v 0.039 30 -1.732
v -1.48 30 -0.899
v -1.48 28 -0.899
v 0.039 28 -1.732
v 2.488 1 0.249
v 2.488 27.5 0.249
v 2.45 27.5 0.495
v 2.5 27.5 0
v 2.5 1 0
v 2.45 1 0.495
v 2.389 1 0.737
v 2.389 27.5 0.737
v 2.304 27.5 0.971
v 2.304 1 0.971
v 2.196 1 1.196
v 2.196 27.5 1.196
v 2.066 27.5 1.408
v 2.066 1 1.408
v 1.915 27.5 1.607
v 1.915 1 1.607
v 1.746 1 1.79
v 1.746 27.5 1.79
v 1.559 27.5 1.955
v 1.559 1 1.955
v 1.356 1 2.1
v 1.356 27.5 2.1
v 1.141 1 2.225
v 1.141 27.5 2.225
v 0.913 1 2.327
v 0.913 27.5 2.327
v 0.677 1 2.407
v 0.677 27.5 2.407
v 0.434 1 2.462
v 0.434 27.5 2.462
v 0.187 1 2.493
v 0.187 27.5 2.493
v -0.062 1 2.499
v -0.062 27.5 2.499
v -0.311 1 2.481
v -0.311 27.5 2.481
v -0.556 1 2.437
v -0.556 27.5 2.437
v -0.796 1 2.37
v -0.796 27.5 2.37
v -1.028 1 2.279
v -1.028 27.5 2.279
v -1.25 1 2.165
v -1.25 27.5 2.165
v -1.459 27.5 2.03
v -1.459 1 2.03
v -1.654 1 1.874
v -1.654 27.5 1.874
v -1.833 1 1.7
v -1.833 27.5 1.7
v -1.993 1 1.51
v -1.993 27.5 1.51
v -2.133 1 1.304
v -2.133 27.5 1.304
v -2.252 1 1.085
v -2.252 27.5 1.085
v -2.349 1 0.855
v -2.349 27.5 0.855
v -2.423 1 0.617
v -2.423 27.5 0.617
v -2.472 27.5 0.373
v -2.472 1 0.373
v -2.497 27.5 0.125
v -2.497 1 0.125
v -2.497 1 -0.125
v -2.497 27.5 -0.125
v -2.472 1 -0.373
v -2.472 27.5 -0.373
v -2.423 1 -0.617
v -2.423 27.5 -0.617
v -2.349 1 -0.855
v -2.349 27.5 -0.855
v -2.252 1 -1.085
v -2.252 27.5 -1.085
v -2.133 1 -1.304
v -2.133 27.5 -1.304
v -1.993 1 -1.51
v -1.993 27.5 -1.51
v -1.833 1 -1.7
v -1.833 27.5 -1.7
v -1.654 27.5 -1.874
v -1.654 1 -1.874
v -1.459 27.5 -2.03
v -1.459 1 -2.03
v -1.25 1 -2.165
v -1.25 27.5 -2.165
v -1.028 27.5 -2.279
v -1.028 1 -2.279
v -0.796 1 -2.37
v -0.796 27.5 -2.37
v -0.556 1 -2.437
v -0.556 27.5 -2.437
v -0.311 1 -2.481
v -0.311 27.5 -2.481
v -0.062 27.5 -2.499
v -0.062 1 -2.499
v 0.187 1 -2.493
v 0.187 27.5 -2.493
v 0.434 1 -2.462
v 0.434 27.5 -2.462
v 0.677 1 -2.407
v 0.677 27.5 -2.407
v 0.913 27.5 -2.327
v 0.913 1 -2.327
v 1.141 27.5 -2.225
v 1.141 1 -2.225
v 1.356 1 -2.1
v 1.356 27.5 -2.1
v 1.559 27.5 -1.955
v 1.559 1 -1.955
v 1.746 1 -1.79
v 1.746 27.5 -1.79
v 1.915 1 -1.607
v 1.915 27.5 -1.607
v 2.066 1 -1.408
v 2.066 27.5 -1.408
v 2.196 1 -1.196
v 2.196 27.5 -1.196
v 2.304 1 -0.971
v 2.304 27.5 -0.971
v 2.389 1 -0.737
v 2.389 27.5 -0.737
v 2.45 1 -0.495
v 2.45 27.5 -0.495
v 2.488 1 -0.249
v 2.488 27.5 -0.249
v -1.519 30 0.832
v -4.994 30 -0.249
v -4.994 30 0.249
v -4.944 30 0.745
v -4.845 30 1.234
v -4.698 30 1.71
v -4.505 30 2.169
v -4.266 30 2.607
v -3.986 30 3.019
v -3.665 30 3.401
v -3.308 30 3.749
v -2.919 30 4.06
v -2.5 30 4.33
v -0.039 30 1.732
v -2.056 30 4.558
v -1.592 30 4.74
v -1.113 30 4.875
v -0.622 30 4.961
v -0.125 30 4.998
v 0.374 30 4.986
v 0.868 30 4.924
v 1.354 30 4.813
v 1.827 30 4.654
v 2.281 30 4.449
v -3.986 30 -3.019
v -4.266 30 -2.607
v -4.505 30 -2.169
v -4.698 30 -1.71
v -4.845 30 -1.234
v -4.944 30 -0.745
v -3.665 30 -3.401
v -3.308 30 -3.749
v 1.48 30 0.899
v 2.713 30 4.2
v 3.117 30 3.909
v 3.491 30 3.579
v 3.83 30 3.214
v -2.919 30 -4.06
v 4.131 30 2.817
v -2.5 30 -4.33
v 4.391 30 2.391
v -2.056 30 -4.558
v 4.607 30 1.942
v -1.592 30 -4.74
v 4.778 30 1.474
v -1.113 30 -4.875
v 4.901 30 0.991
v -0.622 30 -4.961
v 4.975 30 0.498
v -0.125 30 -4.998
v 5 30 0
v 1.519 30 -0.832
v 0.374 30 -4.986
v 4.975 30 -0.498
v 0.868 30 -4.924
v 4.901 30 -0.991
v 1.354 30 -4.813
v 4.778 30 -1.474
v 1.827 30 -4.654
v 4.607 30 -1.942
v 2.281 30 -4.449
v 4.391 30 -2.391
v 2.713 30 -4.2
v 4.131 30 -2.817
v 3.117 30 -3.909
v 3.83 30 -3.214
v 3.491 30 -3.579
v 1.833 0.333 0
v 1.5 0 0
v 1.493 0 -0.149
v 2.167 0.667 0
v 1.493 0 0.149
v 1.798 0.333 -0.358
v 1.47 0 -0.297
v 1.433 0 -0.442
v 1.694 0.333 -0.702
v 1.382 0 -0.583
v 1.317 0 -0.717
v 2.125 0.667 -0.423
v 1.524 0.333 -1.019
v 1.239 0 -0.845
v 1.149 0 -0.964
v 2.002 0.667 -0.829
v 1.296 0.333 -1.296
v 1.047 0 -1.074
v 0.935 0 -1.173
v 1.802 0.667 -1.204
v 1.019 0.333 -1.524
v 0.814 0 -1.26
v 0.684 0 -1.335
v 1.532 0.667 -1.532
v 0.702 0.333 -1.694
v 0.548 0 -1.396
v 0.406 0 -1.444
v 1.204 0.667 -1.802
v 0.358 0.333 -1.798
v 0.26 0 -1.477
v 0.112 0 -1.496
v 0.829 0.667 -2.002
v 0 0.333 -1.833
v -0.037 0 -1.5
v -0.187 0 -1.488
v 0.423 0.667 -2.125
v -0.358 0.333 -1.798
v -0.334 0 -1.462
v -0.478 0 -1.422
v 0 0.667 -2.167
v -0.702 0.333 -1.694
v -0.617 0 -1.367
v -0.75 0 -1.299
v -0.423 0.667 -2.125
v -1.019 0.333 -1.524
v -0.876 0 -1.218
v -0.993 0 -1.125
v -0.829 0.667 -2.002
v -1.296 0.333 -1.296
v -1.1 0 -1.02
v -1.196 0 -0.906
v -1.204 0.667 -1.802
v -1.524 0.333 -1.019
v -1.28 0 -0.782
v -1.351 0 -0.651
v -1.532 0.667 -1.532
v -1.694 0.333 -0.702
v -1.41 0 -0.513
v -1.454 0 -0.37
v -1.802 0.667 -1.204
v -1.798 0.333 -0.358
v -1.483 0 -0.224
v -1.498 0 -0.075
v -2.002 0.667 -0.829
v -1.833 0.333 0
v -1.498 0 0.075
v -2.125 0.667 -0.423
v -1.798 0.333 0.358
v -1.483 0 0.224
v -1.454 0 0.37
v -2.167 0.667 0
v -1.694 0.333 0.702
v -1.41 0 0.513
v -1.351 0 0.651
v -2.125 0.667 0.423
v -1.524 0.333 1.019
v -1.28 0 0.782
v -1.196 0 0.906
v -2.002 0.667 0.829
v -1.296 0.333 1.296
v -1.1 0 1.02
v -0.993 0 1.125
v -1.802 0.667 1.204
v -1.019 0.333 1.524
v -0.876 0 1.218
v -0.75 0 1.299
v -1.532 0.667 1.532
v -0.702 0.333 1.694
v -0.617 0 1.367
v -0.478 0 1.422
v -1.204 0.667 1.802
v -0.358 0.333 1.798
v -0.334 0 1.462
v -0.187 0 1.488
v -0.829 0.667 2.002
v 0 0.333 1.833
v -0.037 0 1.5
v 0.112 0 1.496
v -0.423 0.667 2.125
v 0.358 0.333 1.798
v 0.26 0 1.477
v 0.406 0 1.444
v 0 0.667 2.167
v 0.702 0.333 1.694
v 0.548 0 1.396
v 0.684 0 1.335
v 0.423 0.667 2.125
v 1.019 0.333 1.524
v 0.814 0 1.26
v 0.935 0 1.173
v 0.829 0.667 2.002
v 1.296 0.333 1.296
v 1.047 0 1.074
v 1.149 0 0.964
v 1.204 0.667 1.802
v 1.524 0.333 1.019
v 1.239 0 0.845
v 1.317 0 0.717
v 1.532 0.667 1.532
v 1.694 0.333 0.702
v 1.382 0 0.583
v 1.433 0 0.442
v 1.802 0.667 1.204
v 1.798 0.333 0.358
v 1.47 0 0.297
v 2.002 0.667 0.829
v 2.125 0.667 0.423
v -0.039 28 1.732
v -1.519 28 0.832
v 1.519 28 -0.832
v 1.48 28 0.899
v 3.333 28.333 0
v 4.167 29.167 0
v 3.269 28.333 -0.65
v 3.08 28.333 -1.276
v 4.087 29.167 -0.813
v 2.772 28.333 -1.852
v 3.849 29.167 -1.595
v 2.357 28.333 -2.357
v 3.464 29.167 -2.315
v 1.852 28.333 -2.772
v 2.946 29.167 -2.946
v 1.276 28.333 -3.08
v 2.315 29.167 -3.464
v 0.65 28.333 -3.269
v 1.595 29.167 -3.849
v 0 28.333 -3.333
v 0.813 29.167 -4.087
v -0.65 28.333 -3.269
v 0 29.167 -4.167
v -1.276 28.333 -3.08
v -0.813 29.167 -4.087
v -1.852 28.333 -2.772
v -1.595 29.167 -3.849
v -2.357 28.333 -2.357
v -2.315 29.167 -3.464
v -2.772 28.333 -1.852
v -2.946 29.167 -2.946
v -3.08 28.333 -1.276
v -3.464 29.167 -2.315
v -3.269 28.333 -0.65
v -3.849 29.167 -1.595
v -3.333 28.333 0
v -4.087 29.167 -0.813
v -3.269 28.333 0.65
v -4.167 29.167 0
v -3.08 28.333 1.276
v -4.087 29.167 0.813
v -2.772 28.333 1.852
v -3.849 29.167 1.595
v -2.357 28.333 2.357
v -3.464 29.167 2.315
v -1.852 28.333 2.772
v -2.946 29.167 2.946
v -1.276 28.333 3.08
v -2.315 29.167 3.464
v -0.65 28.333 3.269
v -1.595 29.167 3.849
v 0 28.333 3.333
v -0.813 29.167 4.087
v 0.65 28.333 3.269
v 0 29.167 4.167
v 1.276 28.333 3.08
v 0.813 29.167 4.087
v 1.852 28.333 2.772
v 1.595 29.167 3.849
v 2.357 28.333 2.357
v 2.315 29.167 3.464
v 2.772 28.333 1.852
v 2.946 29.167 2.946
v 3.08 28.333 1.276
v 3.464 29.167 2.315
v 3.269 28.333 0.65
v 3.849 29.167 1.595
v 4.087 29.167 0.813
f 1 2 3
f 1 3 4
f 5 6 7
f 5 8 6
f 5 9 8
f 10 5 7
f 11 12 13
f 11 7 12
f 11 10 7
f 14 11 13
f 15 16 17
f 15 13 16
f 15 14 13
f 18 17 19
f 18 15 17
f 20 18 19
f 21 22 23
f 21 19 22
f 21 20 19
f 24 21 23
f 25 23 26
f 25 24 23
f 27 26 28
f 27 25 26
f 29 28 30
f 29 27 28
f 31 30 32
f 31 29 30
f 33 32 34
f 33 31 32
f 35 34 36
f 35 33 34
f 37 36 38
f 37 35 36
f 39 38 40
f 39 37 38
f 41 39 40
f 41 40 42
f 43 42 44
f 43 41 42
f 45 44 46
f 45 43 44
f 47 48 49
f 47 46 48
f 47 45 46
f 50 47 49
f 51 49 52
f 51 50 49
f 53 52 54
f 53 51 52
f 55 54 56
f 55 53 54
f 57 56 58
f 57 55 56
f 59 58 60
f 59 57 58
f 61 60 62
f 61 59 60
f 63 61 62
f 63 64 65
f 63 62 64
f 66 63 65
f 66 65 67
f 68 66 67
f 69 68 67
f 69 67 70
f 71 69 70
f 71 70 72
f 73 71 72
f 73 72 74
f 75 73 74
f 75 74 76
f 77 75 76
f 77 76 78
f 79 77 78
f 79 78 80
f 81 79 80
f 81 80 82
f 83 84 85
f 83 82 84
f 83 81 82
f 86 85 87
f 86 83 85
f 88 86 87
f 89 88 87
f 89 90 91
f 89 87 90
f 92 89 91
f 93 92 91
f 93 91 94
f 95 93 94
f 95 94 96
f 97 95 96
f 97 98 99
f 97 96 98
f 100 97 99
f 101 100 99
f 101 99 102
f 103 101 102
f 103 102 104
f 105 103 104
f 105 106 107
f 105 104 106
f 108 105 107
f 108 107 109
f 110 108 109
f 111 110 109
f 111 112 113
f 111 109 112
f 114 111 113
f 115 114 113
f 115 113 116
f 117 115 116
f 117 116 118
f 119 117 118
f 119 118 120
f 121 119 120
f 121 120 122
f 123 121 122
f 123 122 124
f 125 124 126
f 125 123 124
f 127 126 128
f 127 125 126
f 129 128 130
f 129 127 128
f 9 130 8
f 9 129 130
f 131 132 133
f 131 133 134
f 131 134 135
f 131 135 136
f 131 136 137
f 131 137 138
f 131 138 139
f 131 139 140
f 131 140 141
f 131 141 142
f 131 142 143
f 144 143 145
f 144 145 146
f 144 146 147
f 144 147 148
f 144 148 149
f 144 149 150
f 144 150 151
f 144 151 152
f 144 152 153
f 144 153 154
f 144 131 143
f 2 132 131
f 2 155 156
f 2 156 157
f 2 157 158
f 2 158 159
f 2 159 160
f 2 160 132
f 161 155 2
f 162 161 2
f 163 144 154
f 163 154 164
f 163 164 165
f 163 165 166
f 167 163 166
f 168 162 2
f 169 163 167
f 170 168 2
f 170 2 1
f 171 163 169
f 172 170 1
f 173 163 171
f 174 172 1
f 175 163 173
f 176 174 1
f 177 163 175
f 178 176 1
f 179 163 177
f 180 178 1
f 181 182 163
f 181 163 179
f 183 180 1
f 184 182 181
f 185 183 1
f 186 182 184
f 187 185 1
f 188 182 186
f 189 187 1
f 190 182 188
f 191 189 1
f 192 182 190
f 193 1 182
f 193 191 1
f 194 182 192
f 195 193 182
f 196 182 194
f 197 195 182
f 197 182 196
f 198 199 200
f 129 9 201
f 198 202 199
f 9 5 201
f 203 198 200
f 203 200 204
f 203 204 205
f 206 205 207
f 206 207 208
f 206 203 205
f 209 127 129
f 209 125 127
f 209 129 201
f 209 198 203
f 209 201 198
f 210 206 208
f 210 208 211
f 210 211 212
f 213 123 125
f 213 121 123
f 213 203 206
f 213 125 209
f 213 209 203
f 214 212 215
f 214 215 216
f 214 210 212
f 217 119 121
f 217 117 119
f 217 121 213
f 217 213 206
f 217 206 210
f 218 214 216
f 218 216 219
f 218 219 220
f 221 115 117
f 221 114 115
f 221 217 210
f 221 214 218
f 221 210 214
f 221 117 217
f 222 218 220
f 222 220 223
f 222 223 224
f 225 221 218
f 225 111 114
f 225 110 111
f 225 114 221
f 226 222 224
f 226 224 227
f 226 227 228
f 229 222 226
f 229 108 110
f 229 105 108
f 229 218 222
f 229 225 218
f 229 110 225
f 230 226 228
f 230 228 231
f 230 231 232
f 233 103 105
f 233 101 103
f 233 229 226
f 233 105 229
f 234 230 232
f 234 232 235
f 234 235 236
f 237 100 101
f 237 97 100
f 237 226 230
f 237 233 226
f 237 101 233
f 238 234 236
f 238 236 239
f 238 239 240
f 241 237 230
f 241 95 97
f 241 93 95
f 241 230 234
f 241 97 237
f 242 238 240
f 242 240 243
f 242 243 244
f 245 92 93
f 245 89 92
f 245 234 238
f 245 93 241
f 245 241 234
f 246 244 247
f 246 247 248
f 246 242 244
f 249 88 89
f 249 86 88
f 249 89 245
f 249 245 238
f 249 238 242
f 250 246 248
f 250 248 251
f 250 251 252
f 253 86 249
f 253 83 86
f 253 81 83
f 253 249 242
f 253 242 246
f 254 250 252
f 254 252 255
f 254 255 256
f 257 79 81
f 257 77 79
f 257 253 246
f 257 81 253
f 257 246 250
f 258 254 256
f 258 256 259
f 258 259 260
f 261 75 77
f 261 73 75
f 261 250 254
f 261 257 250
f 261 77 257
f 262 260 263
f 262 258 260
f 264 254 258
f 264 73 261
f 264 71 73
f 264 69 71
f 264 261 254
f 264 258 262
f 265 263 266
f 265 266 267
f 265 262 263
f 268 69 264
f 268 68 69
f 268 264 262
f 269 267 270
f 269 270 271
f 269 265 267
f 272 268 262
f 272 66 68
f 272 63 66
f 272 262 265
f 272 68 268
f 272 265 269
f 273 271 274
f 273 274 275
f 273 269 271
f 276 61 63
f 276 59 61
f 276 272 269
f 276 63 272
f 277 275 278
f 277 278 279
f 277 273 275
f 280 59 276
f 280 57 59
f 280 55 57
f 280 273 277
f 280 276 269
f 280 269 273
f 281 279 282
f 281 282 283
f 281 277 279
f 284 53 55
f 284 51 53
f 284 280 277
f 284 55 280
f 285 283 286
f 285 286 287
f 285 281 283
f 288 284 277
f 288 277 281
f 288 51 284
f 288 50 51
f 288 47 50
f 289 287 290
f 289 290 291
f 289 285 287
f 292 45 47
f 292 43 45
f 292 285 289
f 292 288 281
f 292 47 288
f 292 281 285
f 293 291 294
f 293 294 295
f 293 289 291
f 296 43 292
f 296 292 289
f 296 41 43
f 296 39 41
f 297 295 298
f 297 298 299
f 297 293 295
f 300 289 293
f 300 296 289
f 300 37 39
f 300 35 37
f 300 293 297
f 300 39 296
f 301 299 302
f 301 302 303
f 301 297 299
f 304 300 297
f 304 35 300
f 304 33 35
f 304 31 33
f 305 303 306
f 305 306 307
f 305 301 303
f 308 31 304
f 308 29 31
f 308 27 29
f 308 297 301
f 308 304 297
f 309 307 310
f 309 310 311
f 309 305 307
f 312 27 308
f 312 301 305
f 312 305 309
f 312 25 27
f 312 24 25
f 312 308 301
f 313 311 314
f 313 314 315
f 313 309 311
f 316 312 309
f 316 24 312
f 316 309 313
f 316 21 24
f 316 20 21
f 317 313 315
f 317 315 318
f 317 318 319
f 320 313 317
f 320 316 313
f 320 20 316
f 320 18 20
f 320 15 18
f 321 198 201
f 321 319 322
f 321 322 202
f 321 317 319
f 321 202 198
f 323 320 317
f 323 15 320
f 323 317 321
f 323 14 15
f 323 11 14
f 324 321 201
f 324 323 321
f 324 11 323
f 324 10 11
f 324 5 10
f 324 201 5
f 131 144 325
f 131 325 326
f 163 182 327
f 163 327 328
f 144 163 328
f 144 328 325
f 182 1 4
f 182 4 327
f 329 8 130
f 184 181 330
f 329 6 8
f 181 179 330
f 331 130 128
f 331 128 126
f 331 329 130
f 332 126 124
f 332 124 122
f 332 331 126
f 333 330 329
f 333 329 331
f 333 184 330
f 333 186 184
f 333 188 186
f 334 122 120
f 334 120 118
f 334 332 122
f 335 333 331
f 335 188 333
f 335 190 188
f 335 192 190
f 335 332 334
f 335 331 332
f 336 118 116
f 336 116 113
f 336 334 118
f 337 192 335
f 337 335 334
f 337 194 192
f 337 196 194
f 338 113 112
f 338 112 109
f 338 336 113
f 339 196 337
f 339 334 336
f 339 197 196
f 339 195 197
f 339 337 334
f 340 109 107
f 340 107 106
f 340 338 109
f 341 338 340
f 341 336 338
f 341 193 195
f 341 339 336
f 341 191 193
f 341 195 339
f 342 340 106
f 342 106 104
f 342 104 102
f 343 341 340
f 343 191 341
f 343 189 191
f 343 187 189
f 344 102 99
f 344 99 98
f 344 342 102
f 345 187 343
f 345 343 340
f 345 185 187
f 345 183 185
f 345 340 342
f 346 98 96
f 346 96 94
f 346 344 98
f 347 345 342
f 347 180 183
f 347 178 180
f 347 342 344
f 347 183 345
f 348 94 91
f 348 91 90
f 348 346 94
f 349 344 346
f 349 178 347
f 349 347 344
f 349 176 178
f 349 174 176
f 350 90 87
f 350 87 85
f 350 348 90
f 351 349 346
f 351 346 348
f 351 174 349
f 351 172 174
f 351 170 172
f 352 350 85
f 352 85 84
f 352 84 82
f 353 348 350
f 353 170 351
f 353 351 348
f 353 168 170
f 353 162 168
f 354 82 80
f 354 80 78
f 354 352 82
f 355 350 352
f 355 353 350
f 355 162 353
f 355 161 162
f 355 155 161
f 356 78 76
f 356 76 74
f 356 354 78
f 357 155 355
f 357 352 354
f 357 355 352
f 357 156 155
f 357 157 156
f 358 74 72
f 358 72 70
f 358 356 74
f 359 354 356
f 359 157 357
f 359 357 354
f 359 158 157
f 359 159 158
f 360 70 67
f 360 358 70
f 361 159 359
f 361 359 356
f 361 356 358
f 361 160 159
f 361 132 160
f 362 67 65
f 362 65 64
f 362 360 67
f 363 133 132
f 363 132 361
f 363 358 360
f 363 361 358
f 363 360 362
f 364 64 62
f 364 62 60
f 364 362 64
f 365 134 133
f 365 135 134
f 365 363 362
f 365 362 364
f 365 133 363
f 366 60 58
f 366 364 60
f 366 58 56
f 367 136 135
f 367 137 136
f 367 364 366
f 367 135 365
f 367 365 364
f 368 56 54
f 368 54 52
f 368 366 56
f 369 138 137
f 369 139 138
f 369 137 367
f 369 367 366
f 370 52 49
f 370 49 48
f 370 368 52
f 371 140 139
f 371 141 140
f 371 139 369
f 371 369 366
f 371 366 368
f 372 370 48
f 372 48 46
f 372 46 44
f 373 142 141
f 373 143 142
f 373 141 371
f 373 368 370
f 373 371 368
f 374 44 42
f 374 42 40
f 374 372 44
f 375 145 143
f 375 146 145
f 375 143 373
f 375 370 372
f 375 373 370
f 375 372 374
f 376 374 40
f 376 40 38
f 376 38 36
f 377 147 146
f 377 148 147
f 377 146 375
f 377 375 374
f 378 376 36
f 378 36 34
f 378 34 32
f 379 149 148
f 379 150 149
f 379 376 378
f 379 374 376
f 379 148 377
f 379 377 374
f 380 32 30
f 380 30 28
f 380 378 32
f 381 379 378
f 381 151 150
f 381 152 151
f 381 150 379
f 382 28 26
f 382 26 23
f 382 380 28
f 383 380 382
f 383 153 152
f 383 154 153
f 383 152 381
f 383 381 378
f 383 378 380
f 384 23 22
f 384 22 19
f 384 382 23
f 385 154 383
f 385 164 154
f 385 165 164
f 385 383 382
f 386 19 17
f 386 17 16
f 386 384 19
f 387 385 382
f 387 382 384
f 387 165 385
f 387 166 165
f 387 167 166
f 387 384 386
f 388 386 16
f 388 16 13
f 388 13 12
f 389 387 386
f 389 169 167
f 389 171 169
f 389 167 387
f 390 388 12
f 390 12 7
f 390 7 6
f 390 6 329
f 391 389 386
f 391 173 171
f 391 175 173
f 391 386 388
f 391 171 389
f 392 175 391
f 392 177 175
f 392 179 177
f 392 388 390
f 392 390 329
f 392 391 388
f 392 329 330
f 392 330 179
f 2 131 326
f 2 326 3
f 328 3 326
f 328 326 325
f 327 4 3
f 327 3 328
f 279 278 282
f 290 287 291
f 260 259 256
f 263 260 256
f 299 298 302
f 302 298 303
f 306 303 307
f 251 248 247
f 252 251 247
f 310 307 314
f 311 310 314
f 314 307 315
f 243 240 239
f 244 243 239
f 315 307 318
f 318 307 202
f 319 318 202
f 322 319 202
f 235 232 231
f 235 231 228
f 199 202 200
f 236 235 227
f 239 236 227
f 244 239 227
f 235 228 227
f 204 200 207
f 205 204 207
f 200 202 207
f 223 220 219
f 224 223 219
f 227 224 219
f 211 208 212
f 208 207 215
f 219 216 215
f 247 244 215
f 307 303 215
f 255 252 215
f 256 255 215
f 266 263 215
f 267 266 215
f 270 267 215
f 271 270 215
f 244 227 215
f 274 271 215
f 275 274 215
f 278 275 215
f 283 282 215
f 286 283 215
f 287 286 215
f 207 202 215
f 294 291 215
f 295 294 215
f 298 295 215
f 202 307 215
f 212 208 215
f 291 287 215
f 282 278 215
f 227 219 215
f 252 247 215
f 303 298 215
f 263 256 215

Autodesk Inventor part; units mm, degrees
ref_plane "YZ Plane" through (0, 0, 0) normal (1, 0, 0) x (0, 1, 0)
ref_plane "XZ Plane" through (0, 0, 0) normal (0, 1, 0) x (-1, 0, 0)
ref_plane "XY Plane" through (0, 0, 0) normal (0, 0, 1) x (1, 0, 0)
sketch "Sketch1" plane through (0, 0, 0) normal (0, 0, 1) x (1, 0, 0)
  line L0 (0, 0) -> (0, 30)
  line L1 (0, 30) -> (5, 30)
  line L2 (5, 30) -> (2.5, 27.5)
  line L3 (2.5, 27.5) -> (2.5, 1)
  line L4 (1.5, 0) -> (0, 0)
  line L5 (2.5, 1) -> (1.5, 0)
  point P0 (2.5, 0)
  dimension "d0" = 2.5
  dimension "d2" = 5
  dimension "d3" = 135
  dimension "d4" = 30
  dimension "d6" = 1
  dimension "d7" = 1
revolve "Revolution1" add sketch "Sketch1" angle 360 about axis through (0, 0, 0) along (0, 1, 0)
sketch "Sketch2" plane through (0, 30, 0) normal (0, 1, 0) x (1, 0, 0)
  circle A0 centre (0, 0) radius 5 projected
  line L0 (1.4802, -0.8994) -> (-0.0388, -1.7316)
  line L1 (-0.0388, -1.7316) -> (-1.519, -0.8322)
  line L2 (-1.519, -0.8322) -> (-1.4802, 0.8994)
  line L3 (-1.4802, 0.8994) -> (0.0388, 1.7316)
  line L4 (0.0388, 1.7316) -> (1.519, 0.8322)
  line L5 (1.519, 0.8322) -> (1.4802, -0.8994)
  dimension "d8" = 3
extrude "Extrusion1" cut sketch "Sketch2" against normal blind 2 contours L0 L1 L2 L3 L4 L5
equation "\"d7\" = d6"
properties part number "DIN7991x30"
